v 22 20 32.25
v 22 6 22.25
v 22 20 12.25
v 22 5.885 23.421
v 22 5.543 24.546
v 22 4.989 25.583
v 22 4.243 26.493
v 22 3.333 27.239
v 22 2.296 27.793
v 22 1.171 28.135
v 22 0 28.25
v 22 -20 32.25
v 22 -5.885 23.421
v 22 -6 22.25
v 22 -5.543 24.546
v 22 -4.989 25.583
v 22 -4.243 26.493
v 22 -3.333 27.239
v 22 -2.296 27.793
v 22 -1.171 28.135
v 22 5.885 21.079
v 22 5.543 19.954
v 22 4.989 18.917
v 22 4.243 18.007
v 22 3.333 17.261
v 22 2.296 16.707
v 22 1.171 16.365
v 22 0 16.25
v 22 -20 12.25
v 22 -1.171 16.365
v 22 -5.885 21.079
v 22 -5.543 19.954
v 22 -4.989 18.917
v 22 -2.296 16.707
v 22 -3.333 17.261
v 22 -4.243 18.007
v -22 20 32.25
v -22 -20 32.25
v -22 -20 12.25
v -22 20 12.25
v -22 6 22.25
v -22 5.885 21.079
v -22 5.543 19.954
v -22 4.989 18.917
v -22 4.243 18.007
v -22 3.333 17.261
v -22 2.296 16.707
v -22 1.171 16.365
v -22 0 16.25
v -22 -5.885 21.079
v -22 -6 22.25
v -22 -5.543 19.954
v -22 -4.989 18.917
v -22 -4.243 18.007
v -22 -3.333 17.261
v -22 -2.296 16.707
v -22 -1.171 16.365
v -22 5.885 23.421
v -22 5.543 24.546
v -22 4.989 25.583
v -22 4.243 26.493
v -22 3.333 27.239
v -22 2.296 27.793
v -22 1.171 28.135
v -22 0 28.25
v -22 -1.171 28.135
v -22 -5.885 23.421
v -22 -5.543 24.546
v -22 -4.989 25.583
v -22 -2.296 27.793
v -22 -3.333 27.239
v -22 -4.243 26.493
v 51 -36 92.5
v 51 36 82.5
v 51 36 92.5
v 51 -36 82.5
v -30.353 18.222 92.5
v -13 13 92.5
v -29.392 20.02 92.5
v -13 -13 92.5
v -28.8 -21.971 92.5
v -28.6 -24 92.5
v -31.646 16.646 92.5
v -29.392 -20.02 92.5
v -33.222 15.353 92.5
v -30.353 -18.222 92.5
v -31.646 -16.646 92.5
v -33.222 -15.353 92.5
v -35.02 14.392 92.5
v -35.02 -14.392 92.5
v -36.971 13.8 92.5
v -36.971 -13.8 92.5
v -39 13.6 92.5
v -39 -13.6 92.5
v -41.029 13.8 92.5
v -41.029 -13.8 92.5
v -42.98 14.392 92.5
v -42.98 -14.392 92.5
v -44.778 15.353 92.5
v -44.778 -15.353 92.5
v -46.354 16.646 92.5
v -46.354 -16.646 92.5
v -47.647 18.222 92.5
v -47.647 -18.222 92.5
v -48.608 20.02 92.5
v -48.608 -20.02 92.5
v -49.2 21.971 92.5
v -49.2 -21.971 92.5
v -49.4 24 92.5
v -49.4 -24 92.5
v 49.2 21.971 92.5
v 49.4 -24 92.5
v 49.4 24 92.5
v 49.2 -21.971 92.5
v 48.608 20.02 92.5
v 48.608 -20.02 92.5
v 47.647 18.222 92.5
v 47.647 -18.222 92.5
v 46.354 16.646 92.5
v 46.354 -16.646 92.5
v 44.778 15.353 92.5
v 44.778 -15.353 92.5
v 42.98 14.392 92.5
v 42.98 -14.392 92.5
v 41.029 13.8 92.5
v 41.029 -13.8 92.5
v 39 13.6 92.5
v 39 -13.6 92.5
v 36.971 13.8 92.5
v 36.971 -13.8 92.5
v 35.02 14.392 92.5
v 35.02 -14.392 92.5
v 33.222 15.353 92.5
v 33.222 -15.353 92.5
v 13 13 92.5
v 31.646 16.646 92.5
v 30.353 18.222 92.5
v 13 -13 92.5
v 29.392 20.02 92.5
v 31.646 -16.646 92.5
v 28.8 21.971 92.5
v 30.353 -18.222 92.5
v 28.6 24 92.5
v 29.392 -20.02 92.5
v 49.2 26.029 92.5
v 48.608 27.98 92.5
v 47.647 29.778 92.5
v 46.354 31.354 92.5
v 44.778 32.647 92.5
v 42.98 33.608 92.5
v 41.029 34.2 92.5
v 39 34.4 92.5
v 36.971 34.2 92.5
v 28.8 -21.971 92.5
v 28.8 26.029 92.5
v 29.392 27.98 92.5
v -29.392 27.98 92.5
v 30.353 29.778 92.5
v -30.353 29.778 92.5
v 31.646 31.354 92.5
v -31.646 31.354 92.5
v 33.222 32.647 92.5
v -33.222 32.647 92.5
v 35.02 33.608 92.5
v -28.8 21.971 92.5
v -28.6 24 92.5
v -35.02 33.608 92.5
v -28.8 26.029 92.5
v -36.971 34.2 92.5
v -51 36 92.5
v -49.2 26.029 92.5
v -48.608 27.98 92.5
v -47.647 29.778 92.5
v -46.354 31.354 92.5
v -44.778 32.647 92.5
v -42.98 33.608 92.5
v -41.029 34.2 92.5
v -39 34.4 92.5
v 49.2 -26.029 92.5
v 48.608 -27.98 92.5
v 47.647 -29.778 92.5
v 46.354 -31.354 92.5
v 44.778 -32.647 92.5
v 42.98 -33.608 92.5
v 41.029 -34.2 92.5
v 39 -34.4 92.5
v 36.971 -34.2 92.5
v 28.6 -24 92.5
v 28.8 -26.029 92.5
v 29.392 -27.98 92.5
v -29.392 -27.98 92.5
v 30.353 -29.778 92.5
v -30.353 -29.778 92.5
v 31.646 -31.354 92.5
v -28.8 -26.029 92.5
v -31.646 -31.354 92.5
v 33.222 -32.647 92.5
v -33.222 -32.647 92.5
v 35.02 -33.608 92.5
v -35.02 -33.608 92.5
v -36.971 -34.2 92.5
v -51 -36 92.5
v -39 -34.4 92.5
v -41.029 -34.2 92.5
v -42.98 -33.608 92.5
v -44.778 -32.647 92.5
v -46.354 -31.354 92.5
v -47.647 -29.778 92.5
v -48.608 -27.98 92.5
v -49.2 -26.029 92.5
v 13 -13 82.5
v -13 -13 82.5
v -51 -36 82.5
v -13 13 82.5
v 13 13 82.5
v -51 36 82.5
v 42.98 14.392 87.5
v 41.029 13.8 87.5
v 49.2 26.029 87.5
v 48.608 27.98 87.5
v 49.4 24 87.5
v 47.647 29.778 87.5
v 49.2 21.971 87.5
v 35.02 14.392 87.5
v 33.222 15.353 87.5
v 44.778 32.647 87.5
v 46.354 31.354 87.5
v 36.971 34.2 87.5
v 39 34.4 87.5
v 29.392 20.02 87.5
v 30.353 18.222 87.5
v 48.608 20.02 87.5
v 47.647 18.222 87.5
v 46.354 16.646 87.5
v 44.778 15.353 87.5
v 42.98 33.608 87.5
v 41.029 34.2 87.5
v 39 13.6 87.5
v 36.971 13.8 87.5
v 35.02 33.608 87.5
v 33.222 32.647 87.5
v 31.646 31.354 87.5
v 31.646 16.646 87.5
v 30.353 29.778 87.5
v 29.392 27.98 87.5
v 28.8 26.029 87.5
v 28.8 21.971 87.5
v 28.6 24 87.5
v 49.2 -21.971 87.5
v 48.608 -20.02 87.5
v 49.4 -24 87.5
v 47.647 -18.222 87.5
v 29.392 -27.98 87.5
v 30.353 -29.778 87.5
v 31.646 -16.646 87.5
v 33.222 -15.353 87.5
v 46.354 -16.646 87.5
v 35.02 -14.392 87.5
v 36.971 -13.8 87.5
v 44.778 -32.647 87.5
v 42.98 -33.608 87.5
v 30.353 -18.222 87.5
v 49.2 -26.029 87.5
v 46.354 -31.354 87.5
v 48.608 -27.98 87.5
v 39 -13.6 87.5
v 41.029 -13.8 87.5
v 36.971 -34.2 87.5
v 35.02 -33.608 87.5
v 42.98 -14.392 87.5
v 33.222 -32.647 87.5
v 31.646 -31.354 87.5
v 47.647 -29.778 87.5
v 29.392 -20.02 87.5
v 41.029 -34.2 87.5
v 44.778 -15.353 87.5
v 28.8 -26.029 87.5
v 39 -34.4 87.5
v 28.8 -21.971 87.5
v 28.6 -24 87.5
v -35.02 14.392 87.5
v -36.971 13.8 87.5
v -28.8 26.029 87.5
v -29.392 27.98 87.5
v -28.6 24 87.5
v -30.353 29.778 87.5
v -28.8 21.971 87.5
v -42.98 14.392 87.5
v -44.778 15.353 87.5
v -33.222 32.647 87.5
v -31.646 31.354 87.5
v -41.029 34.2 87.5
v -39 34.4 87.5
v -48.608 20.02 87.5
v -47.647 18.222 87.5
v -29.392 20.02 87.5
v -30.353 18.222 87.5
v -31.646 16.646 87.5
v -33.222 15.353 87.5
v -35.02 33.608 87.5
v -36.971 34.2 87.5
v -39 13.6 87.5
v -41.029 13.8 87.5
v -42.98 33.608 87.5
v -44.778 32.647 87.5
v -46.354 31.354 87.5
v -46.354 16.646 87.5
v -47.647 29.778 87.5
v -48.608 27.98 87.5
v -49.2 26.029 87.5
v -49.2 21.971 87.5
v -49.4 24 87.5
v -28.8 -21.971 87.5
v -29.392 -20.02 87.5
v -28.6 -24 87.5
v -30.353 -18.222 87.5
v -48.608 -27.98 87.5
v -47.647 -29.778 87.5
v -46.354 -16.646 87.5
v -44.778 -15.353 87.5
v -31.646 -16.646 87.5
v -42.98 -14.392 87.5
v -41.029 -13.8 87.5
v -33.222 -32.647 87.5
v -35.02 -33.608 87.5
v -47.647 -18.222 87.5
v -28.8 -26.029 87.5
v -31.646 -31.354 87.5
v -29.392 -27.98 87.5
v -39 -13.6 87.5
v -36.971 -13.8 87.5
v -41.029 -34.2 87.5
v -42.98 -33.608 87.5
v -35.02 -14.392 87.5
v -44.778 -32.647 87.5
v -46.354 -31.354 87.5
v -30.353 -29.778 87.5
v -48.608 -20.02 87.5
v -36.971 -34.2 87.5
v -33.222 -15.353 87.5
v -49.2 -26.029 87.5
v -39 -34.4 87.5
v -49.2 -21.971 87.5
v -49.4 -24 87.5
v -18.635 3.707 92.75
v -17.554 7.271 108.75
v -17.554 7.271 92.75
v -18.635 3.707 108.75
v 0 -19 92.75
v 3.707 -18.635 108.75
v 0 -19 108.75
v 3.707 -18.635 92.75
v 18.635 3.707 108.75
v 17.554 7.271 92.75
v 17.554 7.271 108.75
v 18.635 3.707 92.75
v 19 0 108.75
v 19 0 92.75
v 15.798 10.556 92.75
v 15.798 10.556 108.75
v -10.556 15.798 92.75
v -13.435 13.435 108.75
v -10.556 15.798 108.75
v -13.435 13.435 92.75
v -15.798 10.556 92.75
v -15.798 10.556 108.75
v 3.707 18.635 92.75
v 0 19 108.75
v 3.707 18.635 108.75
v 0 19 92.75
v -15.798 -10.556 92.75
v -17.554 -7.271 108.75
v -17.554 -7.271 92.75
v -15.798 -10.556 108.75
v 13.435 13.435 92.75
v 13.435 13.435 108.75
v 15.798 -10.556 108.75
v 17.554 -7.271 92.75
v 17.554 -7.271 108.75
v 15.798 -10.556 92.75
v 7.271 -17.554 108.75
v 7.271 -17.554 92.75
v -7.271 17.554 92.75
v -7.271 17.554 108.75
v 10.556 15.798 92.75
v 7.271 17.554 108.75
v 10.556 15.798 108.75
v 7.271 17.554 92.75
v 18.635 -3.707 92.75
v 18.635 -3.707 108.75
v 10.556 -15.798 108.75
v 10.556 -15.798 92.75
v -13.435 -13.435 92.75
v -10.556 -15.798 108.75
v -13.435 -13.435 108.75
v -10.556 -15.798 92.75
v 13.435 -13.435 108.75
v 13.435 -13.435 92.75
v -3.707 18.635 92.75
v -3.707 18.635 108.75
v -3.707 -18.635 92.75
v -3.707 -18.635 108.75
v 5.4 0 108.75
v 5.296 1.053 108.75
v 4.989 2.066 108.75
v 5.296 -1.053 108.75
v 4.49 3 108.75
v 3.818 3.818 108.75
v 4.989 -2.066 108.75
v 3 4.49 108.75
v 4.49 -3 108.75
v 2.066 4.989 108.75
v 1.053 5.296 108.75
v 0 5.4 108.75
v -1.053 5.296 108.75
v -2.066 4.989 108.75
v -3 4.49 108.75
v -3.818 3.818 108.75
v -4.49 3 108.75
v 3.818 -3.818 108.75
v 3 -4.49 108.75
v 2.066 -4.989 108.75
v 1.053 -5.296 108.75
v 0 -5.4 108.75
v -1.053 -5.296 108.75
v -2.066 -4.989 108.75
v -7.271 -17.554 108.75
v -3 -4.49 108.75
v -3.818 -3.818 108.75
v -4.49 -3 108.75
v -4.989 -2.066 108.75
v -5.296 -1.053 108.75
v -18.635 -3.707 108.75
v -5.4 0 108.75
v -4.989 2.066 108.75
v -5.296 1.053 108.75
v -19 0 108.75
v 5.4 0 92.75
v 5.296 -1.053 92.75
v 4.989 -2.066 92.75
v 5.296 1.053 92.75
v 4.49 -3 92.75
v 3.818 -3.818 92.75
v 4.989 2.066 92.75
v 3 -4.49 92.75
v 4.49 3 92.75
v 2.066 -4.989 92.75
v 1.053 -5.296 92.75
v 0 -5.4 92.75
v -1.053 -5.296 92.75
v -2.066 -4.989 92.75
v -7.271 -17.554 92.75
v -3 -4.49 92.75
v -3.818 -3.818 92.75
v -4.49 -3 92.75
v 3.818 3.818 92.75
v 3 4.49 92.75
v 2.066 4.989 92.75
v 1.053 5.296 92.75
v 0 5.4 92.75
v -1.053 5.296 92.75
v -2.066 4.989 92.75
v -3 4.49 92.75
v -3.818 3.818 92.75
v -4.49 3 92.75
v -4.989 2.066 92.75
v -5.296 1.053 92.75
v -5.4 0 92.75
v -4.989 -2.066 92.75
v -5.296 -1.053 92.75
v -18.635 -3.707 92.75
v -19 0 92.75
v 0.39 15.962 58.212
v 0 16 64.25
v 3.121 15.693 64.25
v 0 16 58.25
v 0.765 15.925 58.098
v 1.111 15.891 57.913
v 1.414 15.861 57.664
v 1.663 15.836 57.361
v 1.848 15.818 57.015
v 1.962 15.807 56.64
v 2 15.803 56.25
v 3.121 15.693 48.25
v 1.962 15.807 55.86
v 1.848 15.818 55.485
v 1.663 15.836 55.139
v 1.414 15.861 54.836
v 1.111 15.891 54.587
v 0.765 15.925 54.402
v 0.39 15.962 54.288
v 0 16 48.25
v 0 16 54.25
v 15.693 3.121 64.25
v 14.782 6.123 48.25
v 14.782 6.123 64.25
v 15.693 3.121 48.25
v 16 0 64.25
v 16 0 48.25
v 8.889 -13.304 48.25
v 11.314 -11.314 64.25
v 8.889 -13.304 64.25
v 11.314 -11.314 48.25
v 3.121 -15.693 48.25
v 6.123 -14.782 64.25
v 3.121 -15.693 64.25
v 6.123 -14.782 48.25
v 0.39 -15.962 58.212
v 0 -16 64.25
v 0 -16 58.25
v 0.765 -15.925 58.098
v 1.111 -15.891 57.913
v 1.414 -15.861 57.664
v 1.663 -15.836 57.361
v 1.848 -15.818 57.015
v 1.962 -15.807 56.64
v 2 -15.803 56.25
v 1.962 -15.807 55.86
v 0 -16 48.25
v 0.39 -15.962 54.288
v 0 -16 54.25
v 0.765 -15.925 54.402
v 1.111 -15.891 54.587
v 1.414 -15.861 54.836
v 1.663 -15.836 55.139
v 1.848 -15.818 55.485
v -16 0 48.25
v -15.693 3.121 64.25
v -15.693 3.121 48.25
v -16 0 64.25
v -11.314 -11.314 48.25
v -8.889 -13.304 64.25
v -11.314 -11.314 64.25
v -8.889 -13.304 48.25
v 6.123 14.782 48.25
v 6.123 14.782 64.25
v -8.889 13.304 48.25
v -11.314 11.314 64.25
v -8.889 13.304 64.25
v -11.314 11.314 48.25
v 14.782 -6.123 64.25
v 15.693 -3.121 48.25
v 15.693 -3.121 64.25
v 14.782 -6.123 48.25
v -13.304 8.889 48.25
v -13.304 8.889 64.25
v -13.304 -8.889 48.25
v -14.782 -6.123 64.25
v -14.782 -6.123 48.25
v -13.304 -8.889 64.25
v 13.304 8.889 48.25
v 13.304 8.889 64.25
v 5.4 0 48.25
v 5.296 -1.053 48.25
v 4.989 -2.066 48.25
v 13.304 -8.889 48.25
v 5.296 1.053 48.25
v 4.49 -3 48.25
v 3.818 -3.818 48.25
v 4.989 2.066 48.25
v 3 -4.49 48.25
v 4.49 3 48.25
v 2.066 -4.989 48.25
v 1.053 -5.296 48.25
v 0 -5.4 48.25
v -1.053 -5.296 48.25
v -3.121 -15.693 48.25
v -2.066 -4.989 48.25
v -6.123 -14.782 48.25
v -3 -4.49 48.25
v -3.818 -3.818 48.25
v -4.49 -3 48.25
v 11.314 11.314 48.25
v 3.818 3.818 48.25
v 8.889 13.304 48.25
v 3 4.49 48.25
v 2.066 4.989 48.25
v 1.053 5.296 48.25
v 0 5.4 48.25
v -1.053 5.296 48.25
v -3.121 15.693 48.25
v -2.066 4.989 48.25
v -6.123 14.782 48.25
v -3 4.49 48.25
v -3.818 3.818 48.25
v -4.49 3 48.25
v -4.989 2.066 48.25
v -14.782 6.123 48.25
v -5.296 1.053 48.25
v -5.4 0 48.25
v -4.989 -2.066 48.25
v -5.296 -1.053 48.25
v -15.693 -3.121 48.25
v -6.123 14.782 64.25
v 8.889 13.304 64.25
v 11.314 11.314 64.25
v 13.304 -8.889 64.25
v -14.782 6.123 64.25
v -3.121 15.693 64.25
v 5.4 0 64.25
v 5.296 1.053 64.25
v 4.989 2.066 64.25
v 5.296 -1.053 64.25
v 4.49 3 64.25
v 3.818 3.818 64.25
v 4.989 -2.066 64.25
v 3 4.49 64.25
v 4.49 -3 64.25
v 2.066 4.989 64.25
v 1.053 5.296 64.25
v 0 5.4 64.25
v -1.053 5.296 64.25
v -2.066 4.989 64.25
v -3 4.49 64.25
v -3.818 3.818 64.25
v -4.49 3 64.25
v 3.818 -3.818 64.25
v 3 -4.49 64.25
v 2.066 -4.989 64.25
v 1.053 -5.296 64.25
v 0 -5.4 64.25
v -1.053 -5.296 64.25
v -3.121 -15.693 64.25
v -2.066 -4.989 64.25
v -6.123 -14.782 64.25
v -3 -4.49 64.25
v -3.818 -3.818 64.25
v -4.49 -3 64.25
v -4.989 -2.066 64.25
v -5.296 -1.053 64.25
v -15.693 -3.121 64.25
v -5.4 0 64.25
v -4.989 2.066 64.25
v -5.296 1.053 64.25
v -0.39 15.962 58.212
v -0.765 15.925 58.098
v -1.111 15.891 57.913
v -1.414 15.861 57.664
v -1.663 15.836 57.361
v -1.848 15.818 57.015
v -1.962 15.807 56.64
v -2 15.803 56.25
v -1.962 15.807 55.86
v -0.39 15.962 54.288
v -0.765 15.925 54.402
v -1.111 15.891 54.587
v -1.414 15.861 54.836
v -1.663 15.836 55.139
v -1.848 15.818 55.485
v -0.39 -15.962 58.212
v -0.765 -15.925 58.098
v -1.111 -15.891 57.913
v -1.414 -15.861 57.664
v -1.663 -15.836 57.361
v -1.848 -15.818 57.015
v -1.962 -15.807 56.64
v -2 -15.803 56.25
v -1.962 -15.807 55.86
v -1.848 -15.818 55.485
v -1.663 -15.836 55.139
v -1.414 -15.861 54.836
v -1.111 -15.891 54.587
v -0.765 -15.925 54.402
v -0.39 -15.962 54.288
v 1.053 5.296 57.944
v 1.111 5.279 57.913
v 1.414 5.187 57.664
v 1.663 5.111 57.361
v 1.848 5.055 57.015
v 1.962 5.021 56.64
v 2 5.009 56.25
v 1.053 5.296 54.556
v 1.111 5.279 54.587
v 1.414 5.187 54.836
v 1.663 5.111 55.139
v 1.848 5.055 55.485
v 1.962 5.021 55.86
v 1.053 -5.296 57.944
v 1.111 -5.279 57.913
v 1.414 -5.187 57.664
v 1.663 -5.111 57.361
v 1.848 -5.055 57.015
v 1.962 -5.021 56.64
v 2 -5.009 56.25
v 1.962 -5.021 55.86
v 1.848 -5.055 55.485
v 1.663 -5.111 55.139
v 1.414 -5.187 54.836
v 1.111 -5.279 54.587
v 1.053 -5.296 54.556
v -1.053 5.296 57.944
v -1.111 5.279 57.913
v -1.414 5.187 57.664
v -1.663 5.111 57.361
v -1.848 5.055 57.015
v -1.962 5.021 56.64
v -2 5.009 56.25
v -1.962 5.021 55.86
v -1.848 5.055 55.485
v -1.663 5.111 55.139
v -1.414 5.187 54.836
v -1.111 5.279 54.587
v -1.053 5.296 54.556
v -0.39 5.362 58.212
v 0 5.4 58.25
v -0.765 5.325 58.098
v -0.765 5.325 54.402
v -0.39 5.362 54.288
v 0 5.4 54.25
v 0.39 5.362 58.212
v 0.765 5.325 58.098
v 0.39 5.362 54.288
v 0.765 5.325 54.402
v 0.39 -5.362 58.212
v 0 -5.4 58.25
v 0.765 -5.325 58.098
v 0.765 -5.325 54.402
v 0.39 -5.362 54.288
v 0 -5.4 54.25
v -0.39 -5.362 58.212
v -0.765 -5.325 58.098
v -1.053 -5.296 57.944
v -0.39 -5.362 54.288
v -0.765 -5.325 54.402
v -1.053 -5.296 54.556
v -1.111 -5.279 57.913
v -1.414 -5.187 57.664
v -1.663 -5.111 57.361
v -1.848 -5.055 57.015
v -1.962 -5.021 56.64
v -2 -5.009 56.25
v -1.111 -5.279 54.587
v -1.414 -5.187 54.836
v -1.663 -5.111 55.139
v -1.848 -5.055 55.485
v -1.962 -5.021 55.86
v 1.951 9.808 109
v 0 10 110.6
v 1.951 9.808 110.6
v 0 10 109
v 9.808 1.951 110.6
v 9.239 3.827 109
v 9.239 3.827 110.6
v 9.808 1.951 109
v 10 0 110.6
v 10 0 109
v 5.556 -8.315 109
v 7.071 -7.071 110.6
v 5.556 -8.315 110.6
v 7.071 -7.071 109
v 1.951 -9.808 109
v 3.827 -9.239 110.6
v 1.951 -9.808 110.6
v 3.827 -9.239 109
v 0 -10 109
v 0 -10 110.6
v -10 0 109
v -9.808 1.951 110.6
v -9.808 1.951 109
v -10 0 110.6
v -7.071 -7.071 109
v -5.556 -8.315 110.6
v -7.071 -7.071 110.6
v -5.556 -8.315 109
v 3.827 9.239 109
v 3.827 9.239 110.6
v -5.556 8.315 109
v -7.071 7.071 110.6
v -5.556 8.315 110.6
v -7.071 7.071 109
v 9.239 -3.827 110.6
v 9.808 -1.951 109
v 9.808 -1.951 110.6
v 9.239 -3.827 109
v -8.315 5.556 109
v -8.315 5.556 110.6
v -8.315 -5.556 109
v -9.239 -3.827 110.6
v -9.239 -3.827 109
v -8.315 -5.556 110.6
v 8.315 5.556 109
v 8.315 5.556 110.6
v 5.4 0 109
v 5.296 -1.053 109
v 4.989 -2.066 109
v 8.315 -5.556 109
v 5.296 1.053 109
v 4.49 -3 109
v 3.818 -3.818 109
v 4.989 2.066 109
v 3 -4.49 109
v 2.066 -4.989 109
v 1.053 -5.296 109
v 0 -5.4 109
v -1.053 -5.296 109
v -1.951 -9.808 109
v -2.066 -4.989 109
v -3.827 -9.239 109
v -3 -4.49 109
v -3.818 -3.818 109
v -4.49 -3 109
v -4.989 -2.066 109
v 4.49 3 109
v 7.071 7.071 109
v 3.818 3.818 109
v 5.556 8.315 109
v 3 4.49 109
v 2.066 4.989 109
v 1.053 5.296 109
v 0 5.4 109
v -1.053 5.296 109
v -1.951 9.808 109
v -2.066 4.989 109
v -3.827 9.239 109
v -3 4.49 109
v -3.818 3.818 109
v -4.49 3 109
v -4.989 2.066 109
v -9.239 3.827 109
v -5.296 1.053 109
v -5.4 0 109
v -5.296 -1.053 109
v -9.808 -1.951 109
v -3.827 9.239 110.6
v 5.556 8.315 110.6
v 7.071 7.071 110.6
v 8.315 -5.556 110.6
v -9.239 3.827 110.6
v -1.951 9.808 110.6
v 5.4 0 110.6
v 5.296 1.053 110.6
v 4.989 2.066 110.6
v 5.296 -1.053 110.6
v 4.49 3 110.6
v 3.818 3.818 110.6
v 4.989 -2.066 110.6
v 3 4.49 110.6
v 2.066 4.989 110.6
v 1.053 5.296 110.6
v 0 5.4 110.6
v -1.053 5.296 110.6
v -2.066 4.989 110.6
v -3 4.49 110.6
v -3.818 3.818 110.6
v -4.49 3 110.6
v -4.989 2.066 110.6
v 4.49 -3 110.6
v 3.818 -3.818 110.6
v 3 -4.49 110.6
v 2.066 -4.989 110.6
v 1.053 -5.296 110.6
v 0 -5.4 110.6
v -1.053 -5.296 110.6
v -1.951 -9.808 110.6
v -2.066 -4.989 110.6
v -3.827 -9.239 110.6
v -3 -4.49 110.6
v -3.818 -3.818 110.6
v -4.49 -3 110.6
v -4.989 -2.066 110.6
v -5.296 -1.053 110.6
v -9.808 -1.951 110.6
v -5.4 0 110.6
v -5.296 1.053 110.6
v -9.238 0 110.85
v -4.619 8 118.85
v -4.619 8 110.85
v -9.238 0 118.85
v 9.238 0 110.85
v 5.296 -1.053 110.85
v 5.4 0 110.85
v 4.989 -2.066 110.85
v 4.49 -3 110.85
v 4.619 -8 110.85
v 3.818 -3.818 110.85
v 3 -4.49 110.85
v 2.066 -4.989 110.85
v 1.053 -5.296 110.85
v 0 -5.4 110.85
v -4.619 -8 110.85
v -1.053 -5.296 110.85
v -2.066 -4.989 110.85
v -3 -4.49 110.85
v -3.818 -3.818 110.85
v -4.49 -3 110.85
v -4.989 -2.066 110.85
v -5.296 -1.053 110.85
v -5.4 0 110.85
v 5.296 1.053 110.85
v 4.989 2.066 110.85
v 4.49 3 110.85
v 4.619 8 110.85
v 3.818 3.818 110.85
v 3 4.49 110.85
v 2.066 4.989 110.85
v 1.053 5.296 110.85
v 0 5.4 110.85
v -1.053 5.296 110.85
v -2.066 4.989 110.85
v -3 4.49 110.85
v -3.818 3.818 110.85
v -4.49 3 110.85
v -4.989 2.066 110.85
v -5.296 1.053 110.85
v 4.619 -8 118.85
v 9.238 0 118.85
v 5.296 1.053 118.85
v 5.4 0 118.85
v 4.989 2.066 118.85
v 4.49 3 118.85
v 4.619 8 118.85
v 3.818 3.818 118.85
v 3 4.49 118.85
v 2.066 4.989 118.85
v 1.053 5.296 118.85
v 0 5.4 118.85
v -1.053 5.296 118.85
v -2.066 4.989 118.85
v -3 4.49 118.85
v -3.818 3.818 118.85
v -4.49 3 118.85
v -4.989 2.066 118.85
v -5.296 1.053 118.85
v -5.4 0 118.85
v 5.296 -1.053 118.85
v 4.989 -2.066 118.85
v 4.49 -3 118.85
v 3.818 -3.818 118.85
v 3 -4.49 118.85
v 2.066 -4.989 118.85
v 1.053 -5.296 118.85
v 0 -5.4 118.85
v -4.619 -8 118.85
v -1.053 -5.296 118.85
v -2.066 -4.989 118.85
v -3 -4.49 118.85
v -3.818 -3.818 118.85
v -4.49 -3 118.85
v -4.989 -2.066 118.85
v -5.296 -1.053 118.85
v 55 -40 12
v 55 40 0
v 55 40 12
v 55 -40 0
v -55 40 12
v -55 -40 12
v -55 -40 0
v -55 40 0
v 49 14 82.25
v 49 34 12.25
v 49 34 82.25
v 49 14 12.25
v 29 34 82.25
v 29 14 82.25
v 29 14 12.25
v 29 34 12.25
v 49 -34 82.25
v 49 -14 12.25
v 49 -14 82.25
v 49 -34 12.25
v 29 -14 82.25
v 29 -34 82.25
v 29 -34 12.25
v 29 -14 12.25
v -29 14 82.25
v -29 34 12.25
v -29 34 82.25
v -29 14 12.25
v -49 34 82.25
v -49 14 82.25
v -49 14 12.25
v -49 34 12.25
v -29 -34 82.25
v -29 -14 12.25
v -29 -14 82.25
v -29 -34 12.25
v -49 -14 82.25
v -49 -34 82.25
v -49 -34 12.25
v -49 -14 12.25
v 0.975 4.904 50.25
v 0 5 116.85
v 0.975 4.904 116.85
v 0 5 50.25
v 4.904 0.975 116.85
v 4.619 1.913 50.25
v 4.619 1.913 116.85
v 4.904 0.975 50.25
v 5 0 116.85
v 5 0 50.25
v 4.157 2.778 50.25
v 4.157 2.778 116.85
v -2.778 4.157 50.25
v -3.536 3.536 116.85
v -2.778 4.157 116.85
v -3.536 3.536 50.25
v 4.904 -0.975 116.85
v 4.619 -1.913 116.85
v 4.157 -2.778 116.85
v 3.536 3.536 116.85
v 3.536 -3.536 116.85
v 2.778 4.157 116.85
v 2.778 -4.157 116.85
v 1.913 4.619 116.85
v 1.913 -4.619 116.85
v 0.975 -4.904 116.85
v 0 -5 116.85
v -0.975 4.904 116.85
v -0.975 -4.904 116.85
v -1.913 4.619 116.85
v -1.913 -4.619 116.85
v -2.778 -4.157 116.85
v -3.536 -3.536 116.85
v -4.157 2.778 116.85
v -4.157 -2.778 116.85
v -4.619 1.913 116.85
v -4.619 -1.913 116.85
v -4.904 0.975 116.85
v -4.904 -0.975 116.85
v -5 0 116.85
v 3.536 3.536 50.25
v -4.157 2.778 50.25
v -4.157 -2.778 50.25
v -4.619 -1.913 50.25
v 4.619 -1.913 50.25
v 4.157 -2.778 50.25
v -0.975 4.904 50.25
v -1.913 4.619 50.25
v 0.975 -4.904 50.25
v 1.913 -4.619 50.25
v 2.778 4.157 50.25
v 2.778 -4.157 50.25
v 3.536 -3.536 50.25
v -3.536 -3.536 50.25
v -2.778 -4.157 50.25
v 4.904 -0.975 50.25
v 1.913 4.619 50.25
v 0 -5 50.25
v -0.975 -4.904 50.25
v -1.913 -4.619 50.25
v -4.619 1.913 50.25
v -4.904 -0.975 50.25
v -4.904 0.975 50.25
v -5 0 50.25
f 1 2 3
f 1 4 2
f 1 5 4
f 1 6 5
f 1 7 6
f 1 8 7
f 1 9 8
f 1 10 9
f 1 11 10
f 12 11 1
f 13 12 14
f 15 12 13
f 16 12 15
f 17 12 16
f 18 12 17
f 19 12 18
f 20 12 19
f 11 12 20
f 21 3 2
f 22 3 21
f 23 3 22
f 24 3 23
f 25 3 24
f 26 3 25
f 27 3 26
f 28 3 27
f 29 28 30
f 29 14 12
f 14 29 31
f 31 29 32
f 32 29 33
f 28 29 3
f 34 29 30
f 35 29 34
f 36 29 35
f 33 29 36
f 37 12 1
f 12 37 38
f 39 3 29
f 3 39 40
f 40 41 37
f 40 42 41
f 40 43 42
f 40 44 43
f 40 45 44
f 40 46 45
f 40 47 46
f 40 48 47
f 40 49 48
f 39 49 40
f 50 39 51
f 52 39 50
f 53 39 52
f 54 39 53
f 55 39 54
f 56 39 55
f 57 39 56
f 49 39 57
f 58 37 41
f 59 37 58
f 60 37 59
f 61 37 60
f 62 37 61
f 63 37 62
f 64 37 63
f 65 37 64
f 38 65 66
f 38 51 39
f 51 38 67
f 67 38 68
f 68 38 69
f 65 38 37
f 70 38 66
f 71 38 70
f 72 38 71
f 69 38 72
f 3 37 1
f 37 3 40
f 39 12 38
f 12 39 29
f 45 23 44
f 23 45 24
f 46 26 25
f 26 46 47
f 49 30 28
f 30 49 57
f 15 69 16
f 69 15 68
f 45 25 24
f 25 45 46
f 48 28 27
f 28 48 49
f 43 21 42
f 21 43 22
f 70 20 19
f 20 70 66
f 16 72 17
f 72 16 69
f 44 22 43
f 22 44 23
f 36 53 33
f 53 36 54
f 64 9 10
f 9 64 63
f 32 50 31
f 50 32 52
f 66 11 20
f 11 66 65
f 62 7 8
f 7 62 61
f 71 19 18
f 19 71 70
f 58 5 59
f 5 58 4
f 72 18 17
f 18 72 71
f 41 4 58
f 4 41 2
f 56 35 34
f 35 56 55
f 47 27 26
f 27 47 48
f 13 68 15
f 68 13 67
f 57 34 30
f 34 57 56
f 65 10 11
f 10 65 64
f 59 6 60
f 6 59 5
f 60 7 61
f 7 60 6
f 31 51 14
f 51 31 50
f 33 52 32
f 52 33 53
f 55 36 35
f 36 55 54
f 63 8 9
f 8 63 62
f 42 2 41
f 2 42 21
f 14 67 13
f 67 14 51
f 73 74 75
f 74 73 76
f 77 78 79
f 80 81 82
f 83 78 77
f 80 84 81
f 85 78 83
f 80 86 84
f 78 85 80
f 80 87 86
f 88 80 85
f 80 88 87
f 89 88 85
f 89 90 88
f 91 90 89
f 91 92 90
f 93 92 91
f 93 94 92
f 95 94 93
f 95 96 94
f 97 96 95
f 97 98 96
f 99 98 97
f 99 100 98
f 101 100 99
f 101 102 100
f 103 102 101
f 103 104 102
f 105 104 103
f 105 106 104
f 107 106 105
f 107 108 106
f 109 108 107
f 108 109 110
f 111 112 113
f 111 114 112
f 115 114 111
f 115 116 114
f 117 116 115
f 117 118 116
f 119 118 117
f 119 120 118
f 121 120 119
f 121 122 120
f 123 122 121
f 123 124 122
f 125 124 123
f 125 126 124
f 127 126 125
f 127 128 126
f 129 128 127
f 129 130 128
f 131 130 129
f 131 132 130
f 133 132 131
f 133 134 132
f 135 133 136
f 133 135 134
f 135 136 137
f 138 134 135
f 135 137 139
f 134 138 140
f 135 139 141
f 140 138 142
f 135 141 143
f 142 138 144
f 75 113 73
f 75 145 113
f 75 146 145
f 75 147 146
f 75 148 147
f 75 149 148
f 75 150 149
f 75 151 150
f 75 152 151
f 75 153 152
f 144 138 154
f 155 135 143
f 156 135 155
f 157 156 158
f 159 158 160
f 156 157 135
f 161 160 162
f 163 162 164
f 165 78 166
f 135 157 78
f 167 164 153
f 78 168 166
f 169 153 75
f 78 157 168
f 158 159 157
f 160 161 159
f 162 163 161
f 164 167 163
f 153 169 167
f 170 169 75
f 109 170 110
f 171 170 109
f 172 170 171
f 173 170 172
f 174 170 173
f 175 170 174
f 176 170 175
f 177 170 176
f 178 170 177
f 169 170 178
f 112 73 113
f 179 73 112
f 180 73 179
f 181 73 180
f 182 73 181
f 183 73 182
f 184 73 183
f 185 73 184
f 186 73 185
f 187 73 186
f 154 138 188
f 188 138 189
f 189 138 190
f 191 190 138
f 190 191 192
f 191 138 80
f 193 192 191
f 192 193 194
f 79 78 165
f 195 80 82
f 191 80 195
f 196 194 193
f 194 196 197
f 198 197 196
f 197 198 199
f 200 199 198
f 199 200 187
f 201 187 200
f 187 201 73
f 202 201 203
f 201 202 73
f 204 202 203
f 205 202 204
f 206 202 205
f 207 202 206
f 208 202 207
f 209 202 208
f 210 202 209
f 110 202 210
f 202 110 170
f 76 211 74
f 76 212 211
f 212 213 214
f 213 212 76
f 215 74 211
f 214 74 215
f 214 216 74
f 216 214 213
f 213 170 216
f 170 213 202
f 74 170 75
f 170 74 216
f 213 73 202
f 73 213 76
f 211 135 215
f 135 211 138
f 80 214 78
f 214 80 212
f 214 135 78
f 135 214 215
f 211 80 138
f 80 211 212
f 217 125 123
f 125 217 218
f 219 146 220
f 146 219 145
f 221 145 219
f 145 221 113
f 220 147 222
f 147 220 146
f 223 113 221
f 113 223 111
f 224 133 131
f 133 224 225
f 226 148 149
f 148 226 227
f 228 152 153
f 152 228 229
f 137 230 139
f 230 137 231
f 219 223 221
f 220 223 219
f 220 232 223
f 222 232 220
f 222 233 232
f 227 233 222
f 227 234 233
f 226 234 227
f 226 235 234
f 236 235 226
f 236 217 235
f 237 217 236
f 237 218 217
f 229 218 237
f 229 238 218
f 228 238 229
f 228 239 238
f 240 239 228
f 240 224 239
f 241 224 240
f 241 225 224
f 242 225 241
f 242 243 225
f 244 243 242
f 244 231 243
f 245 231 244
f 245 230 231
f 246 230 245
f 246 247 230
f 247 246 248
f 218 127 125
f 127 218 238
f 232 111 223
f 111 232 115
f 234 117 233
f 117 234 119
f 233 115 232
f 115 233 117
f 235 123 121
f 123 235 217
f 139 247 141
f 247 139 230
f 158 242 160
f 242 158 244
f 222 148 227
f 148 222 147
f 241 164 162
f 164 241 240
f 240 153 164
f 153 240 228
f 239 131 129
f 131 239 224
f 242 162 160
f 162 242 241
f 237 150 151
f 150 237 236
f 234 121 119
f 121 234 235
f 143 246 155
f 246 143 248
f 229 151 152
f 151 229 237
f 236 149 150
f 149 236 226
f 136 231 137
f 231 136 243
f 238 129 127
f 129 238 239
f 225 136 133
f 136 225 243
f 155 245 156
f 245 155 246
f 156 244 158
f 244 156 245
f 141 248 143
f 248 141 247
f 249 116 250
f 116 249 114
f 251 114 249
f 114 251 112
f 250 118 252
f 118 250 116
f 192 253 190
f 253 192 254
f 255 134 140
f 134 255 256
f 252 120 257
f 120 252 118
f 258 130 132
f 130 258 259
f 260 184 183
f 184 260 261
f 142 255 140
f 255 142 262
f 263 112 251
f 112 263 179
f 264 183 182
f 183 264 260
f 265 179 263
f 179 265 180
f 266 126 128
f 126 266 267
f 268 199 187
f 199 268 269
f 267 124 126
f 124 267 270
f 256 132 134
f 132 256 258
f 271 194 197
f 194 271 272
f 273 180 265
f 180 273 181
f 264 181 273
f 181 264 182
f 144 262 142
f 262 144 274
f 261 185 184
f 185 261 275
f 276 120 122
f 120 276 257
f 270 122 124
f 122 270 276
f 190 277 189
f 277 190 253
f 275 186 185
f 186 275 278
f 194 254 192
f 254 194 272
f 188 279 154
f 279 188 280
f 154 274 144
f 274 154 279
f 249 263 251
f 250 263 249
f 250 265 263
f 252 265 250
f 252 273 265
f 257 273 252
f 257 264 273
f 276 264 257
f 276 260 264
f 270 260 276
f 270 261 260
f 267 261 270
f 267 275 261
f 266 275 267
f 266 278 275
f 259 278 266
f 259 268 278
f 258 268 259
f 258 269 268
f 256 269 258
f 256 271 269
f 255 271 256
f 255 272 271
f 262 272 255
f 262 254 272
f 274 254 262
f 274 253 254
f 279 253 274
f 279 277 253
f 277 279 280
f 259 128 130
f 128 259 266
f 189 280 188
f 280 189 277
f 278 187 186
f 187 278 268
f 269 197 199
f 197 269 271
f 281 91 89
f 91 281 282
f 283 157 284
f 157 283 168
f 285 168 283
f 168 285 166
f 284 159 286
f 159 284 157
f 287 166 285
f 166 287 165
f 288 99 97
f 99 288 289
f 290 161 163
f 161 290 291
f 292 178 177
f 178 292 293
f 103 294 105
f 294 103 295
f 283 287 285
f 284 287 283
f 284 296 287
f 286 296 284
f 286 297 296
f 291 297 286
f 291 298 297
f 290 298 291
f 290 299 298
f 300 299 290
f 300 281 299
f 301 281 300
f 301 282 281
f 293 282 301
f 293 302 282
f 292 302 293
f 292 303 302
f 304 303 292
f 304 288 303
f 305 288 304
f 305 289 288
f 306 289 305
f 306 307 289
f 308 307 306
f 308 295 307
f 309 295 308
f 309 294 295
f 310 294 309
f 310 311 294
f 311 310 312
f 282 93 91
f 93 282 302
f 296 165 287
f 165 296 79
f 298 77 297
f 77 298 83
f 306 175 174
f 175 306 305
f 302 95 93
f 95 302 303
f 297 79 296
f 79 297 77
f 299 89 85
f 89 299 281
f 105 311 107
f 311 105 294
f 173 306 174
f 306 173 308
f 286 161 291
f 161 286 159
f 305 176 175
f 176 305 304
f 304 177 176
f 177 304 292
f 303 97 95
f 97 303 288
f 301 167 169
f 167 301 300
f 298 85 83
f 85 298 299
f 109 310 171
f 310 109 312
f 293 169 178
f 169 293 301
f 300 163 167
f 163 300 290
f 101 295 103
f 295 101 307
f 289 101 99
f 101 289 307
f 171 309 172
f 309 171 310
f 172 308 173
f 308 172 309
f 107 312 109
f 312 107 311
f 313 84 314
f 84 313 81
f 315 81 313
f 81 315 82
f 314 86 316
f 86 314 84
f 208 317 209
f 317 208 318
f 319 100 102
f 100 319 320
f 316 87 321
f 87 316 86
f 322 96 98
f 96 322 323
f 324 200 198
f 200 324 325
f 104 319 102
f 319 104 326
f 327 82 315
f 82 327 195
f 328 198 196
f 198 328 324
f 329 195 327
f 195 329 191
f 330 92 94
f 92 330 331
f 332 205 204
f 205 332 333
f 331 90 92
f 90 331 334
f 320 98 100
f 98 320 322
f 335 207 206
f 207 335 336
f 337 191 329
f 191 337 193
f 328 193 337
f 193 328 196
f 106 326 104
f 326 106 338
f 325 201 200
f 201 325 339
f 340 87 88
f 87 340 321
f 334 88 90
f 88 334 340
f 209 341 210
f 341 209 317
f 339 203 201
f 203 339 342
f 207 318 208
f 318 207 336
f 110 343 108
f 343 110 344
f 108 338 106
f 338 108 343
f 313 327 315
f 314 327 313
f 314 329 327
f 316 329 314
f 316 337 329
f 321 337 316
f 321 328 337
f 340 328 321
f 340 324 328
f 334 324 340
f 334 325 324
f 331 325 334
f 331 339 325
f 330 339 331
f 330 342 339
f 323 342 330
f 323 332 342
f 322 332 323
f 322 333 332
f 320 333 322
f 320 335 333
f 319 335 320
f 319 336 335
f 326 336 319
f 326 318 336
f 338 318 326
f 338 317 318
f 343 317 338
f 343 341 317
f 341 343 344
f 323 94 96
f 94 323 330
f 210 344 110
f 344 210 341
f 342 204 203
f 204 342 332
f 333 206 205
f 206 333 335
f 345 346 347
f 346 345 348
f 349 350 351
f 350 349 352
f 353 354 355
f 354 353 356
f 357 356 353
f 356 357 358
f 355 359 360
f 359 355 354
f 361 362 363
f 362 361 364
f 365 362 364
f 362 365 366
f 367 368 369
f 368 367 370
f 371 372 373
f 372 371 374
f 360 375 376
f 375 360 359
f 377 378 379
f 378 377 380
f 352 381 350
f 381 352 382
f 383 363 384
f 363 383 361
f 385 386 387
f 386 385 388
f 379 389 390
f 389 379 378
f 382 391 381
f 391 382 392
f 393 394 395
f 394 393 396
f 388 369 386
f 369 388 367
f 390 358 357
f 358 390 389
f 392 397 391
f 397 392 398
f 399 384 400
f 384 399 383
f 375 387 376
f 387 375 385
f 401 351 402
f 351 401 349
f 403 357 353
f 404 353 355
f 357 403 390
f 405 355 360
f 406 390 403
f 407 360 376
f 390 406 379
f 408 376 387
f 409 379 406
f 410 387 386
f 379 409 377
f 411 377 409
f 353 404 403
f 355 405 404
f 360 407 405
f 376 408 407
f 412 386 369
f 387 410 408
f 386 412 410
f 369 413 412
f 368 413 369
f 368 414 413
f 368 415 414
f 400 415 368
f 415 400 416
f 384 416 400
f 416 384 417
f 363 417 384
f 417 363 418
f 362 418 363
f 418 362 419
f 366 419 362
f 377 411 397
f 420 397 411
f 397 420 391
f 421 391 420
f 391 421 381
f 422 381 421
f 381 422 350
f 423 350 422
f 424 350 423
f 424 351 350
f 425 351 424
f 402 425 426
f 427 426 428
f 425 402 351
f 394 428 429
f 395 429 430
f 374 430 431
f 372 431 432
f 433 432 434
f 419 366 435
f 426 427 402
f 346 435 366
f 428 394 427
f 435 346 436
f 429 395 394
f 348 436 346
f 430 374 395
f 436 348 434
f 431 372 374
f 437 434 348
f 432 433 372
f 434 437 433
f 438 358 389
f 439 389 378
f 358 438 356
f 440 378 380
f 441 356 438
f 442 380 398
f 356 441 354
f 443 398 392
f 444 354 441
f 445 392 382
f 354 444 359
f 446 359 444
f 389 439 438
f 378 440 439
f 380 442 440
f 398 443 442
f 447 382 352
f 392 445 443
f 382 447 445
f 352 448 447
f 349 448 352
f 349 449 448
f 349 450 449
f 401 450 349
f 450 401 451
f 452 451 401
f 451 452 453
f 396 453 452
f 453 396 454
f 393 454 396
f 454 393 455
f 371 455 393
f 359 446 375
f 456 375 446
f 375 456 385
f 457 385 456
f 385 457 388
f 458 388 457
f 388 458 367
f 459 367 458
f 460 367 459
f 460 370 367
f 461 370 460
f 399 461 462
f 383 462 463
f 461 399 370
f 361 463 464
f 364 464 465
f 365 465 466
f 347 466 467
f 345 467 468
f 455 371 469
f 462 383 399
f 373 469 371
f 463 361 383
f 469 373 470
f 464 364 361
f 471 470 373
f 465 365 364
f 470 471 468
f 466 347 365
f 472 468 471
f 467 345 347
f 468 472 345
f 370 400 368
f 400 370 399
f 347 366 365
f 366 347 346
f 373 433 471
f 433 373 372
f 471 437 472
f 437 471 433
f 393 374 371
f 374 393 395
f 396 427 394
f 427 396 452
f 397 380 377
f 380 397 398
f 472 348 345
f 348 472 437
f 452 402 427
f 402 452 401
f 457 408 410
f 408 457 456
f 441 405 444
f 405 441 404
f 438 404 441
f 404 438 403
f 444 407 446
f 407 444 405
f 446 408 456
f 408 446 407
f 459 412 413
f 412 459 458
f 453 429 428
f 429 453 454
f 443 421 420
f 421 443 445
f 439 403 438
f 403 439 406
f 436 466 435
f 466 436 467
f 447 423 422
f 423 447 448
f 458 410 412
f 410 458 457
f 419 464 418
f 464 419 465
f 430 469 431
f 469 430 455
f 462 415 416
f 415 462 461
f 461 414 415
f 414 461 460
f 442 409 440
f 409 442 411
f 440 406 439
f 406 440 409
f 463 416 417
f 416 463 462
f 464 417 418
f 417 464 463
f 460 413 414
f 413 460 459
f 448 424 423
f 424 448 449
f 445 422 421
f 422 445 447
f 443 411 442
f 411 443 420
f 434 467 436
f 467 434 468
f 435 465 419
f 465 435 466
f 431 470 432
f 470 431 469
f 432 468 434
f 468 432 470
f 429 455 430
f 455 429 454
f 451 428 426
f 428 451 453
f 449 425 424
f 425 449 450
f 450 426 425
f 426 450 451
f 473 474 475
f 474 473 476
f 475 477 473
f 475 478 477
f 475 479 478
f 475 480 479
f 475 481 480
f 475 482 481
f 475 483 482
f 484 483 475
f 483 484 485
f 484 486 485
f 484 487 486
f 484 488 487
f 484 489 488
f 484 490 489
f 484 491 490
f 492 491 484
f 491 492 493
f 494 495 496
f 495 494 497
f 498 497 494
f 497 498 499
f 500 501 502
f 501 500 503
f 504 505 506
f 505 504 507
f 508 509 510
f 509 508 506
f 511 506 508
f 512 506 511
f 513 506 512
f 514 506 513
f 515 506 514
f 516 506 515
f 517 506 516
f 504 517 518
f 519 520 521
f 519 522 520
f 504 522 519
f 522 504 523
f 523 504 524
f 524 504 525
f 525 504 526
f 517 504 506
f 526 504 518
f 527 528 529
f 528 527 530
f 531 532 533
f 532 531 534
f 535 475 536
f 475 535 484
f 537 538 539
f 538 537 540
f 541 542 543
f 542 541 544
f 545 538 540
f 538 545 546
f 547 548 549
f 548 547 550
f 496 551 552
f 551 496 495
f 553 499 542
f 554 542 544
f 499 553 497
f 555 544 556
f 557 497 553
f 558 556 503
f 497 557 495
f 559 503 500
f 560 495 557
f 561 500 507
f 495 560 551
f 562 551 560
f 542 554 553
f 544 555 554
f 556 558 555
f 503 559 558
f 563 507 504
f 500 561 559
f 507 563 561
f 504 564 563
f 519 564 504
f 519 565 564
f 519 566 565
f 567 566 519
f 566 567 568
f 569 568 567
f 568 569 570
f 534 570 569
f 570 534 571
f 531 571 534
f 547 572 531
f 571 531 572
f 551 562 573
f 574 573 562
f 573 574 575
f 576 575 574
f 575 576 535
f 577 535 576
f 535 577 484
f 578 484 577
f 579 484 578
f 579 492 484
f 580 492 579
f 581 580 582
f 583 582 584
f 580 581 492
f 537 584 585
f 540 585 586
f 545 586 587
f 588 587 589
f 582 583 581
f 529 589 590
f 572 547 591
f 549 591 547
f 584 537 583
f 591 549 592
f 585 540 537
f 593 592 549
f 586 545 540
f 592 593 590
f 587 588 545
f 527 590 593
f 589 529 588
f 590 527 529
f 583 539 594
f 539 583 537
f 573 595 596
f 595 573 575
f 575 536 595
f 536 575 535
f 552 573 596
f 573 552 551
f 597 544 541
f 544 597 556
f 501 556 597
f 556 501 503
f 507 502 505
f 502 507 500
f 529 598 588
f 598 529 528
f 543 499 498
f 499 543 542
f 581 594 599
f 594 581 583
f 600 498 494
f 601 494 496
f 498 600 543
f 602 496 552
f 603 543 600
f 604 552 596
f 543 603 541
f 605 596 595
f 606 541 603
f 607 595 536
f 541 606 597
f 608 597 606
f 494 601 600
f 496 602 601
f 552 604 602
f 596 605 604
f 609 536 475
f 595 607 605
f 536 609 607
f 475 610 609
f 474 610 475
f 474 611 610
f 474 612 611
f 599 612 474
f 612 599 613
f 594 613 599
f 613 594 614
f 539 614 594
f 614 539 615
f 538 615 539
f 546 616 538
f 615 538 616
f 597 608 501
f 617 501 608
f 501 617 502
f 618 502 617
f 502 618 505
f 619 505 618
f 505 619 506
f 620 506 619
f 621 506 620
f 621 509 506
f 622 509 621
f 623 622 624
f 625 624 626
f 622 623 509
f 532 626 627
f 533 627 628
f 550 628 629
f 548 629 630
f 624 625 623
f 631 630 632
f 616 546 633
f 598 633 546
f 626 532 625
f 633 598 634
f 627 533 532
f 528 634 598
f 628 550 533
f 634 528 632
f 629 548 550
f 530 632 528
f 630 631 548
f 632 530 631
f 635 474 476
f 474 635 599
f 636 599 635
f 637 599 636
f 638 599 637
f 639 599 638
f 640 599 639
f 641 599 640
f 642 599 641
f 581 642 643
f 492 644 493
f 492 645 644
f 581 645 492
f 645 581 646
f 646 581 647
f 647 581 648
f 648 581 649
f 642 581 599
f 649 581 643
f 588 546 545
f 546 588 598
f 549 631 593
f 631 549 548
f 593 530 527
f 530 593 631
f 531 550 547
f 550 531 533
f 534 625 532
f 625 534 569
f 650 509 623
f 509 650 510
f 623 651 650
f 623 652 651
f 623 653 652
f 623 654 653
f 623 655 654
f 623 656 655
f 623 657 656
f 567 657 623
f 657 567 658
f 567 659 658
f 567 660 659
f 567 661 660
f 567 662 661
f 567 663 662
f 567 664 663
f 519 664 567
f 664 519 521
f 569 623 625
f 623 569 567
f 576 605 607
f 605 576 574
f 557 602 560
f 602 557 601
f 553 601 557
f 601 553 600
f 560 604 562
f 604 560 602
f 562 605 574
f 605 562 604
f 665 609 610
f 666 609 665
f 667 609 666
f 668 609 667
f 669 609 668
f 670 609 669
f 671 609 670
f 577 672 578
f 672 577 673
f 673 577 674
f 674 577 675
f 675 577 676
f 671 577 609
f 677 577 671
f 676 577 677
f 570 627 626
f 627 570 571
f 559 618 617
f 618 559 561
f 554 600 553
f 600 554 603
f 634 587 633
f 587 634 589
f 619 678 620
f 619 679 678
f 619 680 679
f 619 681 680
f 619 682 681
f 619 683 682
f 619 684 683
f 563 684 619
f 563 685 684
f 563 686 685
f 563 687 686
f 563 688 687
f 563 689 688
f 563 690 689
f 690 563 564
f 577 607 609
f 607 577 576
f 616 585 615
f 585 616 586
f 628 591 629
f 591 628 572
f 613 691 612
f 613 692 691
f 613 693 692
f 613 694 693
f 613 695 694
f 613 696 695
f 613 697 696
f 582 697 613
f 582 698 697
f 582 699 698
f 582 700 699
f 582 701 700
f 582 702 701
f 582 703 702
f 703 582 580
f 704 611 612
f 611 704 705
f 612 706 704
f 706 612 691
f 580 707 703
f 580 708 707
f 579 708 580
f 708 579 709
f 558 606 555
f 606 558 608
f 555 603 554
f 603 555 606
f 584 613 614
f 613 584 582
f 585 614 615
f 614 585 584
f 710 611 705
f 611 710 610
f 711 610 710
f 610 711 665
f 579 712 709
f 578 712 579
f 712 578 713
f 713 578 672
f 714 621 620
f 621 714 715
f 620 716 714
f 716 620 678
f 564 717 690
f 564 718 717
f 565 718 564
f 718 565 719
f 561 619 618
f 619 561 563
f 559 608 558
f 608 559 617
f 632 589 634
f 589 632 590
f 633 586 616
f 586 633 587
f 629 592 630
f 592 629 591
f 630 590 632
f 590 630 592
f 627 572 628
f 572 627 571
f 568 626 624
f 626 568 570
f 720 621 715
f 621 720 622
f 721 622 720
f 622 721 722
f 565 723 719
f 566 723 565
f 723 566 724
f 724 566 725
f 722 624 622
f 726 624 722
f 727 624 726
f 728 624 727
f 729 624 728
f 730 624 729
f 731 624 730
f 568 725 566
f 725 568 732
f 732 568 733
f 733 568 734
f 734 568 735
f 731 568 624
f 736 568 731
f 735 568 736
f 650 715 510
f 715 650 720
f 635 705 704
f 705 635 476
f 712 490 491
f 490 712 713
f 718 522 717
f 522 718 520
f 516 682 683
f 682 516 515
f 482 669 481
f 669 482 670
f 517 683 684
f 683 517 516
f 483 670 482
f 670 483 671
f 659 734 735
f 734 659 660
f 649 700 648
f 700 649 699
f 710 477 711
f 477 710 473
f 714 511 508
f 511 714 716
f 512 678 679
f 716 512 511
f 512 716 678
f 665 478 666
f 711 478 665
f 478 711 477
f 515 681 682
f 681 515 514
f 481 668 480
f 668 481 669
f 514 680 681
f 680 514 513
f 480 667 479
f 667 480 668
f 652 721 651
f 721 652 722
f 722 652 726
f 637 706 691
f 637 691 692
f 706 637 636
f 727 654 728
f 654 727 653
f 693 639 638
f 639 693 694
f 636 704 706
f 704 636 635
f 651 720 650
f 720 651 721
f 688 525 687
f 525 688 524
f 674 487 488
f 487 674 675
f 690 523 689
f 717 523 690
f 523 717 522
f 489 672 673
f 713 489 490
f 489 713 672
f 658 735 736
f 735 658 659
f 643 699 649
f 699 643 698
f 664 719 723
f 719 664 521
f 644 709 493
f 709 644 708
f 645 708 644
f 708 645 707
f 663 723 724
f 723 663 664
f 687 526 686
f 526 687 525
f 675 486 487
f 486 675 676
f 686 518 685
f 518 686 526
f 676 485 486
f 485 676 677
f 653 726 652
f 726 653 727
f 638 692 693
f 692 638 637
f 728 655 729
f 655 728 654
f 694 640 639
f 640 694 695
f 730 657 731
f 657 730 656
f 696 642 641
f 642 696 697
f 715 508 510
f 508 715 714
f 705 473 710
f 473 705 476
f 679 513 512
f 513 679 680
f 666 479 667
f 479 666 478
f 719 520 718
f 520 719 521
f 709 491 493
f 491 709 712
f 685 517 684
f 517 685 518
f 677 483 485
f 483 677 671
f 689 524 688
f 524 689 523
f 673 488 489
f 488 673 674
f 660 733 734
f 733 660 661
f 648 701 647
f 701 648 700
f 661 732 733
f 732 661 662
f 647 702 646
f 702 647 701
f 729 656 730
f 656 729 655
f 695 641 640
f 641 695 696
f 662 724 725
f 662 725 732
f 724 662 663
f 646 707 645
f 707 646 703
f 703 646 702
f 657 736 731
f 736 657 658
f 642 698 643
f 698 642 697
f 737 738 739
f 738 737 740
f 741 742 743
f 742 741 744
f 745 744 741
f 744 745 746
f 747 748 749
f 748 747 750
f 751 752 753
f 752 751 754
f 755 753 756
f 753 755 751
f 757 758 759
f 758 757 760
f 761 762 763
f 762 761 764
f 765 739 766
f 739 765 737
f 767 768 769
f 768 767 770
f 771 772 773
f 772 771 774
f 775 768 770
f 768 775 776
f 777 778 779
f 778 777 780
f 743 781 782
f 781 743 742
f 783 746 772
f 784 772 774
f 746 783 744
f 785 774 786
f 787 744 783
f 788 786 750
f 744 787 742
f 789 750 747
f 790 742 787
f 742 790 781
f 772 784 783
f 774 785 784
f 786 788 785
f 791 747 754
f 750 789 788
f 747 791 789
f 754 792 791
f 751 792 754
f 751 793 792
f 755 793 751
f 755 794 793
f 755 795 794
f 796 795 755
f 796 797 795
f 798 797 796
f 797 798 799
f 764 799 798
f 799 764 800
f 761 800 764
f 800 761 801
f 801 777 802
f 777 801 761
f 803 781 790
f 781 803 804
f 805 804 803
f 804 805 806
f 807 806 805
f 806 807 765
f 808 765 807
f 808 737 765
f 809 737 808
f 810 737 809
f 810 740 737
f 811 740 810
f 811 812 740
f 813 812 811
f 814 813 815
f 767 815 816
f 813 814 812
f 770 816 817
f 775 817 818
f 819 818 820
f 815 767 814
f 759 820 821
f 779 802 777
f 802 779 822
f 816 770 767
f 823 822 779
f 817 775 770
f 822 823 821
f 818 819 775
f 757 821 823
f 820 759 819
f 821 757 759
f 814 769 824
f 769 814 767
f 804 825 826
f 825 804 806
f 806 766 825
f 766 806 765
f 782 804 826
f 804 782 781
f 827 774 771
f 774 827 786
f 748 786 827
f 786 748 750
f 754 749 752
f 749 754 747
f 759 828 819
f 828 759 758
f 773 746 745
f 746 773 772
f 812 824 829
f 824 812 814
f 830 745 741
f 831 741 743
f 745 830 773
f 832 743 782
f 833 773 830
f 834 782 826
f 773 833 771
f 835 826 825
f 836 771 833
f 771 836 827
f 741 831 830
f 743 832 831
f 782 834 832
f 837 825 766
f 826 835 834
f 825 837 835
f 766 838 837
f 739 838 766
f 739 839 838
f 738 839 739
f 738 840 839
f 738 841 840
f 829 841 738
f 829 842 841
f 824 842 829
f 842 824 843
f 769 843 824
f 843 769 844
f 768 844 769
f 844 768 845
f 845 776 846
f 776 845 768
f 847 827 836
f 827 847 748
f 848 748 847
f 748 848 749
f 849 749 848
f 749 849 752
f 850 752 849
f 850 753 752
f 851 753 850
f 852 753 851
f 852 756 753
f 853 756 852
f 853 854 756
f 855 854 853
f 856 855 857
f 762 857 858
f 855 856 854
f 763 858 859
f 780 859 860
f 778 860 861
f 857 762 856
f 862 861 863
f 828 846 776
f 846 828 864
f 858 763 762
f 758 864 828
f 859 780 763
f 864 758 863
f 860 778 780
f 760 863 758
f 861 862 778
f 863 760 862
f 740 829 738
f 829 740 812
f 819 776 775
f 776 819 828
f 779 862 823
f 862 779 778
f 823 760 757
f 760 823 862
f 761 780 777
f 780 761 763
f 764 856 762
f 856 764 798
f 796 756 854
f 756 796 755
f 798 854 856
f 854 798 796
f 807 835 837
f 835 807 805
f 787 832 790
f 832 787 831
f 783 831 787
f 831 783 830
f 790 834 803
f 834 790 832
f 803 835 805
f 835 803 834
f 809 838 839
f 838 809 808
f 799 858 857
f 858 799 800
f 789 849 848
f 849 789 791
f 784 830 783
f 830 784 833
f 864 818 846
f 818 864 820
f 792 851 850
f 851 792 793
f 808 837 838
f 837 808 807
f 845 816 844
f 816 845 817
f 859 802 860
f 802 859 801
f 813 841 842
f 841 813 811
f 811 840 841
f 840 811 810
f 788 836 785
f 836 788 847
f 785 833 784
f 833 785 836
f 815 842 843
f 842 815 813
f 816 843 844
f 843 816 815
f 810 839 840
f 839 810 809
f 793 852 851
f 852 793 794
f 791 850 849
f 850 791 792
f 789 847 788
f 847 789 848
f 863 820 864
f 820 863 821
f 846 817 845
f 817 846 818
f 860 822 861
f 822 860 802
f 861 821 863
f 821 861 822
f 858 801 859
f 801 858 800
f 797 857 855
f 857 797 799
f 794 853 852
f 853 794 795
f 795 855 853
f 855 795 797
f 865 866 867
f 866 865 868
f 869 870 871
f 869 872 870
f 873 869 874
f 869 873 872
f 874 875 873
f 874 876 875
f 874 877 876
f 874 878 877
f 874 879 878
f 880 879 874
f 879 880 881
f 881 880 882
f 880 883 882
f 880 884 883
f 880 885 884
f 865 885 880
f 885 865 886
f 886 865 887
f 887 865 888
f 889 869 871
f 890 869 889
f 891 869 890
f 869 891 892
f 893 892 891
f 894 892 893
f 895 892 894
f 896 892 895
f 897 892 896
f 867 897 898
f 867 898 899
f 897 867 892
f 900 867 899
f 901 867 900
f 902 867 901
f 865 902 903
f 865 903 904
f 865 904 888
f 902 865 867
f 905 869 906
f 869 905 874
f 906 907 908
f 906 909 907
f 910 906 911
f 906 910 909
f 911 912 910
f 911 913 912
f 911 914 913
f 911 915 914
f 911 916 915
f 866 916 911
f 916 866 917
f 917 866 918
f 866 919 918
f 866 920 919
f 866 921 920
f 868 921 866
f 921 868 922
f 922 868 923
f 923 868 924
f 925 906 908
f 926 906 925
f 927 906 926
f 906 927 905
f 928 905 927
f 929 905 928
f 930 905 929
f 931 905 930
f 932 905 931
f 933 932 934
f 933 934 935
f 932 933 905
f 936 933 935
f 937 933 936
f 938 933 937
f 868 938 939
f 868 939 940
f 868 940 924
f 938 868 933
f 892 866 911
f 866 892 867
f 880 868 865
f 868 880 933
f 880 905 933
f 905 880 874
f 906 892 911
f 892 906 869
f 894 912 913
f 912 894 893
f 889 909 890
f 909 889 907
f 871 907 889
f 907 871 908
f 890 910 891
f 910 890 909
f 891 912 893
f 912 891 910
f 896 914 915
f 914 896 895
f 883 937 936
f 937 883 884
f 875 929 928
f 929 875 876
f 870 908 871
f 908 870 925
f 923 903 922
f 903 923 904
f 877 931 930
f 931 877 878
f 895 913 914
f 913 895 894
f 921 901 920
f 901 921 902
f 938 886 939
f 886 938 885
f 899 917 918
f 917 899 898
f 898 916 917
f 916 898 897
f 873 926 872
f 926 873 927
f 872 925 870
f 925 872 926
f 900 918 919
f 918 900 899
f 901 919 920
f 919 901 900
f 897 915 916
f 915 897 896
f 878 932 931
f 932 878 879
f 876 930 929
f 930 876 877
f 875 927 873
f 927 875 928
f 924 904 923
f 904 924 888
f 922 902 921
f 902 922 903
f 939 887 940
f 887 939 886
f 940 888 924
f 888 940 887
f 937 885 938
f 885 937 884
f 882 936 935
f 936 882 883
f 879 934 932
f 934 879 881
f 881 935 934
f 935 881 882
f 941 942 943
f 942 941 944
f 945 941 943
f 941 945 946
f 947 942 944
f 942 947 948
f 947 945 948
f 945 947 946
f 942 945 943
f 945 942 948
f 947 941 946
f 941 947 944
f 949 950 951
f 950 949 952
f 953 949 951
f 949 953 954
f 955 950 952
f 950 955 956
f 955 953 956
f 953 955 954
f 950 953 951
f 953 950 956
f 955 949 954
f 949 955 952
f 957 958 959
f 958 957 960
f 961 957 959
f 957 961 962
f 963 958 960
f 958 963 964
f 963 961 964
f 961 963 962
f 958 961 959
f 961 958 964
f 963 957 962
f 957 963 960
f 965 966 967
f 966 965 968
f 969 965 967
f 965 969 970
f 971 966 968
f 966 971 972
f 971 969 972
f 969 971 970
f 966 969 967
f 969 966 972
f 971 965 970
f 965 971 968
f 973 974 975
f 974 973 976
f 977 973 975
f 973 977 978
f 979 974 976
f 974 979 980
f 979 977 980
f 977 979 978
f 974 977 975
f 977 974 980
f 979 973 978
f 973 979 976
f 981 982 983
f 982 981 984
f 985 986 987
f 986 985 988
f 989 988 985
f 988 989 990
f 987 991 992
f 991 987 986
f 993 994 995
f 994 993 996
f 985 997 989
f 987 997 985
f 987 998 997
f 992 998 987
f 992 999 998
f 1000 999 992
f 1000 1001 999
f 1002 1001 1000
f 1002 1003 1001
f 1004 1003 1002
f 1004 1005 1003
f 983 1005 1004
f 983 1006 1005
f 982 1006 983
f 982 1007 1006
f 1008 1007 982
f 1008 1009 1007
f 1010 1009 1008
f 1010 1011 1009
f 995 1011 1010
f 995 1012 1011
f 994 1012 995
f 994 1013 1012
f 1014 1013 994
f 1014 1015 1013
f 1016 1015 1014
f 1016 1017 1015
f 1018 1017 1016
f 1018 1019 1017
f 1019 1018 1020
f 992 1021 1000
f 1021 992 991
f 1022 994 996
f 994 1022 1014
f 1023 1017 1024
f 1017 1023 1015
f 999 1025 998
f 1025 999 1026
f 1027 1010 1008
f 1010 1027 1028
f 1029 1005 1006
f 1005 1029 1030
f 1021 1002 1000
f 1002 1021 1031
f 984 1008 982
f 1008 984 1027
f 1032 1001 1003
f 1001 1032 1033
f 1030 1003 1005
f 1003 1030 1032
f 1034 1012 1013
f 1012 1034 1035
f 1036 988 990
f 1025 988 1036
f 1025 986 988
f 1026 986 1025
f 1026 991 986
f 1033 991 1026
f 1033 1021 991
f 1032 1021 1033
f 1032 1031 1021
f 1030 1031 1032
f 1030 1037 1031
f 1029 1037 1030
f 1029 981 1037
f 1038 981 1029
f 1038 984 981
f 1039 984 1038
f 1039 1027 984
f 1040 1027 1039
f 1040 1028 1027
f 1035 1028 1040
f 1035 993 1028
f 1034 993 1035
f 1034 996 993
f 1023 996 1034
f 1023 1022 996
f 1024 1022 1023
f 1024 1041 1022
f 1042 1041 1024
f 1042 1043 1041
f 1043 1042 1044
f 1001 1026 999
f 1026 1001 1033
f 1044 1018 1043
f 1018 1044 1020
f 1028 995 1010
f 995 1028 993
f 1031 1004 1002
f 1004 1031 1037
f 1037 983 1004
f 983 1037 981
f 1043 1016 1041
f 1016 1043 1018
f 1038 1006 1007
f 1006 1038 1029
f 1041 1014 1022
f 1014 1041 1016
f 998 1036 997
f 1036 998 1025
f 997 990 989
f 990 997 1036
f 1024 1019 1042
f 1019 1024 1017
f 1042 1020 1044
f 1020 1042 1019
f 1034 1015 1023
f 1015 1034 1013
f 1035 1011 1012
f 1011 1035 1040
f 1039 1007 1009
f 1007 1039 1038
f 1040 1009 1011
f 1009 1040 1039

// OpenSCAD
$fn = 32;

// ------------------------------------------------------------------------
// Arbor press fixture: screw d10, posts 70 mm, gap 16 mm
// Every part is its own module, assembly() places every instance.
// ------------------------------------------------------------------------

// --- part 1 ---
module press_bed() {
  difference() {
    translate([-55, -40, 0]) cube([110, 80, 12]);
  }
}

// --- part 2 ---
module anvil_block() {
  difference() {
    translate([-22, -20, 0]) cube([44, 40, 20]);
    translate([0, 0, 10]) rotate([0, 90, 0]) cylinder(h = 46, d = 12, center = true);
  }
}

// --- part 3 ---
module press_post_a() {
  translate([-10, -10, 0]) cube([20, 20, 70]);
}

// --- part 4 ---
module press_post_b() {
  translate([-10, -10, 0]) cube([20, 20, 70]);
}

// --- part 5 ---
module press_post_c() {
  translate([-10, -10, 0]) cube([20, 20, 70]);
}

// --- part 6 ---
module press_post_d() {
  translate([-10, -10, 0]) cube([20, 20, 70]);
}

// --- part 7 ---
module press_frame() {
  difference() {
    translate([-51, -36, 0]) cube([102, 72, 10]);
    translate([-13, -13, -1]) cube([26, 26, 12]);
    translate([39, 24, 5]) cylinder(h = 6, d = 20.8);
    translate([39, -24, 5]) cylinder(h = 6, d = 20.8);
    translate([-39, 24, 5]) cylinder(h = 6, d = 20.8);
    translate([-39, -24, 5]) cylinder(h = 6, d = 20.8);
  }
}

// --- part 8 ---
module guide_ring() {
  difference() {
      translate([0, 0, 0]) cylinder(h = 16, d = 38);
      translate([0, 0, -1]) cylinder(h = 18, d = 10.8);
    }
}

// --- part 9 ---
module press_screw() {
  translate([0, 0, -33.3]) cylinder(h = 66.6, d = 10);
}

// --- part 10 ---
module press_head() {
  difference() {
    cylinder(h = 16, d = 32);
    translate([0, 0, -1]) cylinder(h = 18, d = 10.8);
    translate([0, 0, 8]) rotate([90, 0, 0]) cylinder(h = 34, d = 4, center = true);
  }
}

// --- part 11 ---
module nut_washer() {
  difference() {
      translate([0, 0, 0]) cylinder(h = 1.6, d = 20);
      translate([0, 0, -1]) cylinder(h = 3.6, d = 10.8);
    }
}

// --- part 12 ---
module press_nut() {
  difference() {
    linear_extrude(height = 8) polygon(points = [[9.238, 0], [4.619, 8], [-4.619, 8], [-9.238, 0], [-4.619, -8], [4.619, -8]]);
    translate([0, 0, -1]) cylinder(h = 10, d = 10.8);
  }
}

// --- assembly ---
module assembly() {
  color([0.80, 0.24, 0.20]) translate([0, 0, 0]) rotate([0, 0, 0]) press_bed();
  color([0.20, 0.45, 0.75]) translate([0, 0, 12.25]) rotate([0, 0, 0]) anvil_block();
  color([0.25, 0.62, 0.32]) translate([39, 24, 12.25]) rotate([0, 0, 0]) press_post_a();
  color([0.92, 0.70, 0.18]) translate([39, -24, 12.25]) rotate([0, 0, 0]) press_post_b();
  color([0.58, 0.35, 0.70]) translate([-39, 24, 12.25]) rotate([0, 0, 0]) press_post_c();
  color([0.16, 0.66, 0.66]) translate([-39, -24, 12.25]) rotate([0, 0, 0]) press_post_d();
  color([0.85, 0.48, 0.18]) translate([0, 0, 82.5]) rotate([0, 0, 0]) press_frame();
  color([0.55, 0.60, 0.65]) translate([0, 0, 92.75]) rotate([0, 0, 0]) guide_ring();
  color([0.75, 0.30, 0.55]) translate([0, 0, 83.55]) rotate([0, 0, 0]) press_screw();
  color([0.42, 0.52, 0.28]) translate([0, 0, 48.25]) rotate([0, 0, 0]) press_head();
  color([0.80, 0.24, 0.20]) translate([0, 0, 109]) rotate([0, 0, 0]) nut_washer();
  color([0.20, 0.45, 0.75]) translate([0, 0, 110.85]) rotate([0, 0, 0]) press_nut();
}

assembly();
